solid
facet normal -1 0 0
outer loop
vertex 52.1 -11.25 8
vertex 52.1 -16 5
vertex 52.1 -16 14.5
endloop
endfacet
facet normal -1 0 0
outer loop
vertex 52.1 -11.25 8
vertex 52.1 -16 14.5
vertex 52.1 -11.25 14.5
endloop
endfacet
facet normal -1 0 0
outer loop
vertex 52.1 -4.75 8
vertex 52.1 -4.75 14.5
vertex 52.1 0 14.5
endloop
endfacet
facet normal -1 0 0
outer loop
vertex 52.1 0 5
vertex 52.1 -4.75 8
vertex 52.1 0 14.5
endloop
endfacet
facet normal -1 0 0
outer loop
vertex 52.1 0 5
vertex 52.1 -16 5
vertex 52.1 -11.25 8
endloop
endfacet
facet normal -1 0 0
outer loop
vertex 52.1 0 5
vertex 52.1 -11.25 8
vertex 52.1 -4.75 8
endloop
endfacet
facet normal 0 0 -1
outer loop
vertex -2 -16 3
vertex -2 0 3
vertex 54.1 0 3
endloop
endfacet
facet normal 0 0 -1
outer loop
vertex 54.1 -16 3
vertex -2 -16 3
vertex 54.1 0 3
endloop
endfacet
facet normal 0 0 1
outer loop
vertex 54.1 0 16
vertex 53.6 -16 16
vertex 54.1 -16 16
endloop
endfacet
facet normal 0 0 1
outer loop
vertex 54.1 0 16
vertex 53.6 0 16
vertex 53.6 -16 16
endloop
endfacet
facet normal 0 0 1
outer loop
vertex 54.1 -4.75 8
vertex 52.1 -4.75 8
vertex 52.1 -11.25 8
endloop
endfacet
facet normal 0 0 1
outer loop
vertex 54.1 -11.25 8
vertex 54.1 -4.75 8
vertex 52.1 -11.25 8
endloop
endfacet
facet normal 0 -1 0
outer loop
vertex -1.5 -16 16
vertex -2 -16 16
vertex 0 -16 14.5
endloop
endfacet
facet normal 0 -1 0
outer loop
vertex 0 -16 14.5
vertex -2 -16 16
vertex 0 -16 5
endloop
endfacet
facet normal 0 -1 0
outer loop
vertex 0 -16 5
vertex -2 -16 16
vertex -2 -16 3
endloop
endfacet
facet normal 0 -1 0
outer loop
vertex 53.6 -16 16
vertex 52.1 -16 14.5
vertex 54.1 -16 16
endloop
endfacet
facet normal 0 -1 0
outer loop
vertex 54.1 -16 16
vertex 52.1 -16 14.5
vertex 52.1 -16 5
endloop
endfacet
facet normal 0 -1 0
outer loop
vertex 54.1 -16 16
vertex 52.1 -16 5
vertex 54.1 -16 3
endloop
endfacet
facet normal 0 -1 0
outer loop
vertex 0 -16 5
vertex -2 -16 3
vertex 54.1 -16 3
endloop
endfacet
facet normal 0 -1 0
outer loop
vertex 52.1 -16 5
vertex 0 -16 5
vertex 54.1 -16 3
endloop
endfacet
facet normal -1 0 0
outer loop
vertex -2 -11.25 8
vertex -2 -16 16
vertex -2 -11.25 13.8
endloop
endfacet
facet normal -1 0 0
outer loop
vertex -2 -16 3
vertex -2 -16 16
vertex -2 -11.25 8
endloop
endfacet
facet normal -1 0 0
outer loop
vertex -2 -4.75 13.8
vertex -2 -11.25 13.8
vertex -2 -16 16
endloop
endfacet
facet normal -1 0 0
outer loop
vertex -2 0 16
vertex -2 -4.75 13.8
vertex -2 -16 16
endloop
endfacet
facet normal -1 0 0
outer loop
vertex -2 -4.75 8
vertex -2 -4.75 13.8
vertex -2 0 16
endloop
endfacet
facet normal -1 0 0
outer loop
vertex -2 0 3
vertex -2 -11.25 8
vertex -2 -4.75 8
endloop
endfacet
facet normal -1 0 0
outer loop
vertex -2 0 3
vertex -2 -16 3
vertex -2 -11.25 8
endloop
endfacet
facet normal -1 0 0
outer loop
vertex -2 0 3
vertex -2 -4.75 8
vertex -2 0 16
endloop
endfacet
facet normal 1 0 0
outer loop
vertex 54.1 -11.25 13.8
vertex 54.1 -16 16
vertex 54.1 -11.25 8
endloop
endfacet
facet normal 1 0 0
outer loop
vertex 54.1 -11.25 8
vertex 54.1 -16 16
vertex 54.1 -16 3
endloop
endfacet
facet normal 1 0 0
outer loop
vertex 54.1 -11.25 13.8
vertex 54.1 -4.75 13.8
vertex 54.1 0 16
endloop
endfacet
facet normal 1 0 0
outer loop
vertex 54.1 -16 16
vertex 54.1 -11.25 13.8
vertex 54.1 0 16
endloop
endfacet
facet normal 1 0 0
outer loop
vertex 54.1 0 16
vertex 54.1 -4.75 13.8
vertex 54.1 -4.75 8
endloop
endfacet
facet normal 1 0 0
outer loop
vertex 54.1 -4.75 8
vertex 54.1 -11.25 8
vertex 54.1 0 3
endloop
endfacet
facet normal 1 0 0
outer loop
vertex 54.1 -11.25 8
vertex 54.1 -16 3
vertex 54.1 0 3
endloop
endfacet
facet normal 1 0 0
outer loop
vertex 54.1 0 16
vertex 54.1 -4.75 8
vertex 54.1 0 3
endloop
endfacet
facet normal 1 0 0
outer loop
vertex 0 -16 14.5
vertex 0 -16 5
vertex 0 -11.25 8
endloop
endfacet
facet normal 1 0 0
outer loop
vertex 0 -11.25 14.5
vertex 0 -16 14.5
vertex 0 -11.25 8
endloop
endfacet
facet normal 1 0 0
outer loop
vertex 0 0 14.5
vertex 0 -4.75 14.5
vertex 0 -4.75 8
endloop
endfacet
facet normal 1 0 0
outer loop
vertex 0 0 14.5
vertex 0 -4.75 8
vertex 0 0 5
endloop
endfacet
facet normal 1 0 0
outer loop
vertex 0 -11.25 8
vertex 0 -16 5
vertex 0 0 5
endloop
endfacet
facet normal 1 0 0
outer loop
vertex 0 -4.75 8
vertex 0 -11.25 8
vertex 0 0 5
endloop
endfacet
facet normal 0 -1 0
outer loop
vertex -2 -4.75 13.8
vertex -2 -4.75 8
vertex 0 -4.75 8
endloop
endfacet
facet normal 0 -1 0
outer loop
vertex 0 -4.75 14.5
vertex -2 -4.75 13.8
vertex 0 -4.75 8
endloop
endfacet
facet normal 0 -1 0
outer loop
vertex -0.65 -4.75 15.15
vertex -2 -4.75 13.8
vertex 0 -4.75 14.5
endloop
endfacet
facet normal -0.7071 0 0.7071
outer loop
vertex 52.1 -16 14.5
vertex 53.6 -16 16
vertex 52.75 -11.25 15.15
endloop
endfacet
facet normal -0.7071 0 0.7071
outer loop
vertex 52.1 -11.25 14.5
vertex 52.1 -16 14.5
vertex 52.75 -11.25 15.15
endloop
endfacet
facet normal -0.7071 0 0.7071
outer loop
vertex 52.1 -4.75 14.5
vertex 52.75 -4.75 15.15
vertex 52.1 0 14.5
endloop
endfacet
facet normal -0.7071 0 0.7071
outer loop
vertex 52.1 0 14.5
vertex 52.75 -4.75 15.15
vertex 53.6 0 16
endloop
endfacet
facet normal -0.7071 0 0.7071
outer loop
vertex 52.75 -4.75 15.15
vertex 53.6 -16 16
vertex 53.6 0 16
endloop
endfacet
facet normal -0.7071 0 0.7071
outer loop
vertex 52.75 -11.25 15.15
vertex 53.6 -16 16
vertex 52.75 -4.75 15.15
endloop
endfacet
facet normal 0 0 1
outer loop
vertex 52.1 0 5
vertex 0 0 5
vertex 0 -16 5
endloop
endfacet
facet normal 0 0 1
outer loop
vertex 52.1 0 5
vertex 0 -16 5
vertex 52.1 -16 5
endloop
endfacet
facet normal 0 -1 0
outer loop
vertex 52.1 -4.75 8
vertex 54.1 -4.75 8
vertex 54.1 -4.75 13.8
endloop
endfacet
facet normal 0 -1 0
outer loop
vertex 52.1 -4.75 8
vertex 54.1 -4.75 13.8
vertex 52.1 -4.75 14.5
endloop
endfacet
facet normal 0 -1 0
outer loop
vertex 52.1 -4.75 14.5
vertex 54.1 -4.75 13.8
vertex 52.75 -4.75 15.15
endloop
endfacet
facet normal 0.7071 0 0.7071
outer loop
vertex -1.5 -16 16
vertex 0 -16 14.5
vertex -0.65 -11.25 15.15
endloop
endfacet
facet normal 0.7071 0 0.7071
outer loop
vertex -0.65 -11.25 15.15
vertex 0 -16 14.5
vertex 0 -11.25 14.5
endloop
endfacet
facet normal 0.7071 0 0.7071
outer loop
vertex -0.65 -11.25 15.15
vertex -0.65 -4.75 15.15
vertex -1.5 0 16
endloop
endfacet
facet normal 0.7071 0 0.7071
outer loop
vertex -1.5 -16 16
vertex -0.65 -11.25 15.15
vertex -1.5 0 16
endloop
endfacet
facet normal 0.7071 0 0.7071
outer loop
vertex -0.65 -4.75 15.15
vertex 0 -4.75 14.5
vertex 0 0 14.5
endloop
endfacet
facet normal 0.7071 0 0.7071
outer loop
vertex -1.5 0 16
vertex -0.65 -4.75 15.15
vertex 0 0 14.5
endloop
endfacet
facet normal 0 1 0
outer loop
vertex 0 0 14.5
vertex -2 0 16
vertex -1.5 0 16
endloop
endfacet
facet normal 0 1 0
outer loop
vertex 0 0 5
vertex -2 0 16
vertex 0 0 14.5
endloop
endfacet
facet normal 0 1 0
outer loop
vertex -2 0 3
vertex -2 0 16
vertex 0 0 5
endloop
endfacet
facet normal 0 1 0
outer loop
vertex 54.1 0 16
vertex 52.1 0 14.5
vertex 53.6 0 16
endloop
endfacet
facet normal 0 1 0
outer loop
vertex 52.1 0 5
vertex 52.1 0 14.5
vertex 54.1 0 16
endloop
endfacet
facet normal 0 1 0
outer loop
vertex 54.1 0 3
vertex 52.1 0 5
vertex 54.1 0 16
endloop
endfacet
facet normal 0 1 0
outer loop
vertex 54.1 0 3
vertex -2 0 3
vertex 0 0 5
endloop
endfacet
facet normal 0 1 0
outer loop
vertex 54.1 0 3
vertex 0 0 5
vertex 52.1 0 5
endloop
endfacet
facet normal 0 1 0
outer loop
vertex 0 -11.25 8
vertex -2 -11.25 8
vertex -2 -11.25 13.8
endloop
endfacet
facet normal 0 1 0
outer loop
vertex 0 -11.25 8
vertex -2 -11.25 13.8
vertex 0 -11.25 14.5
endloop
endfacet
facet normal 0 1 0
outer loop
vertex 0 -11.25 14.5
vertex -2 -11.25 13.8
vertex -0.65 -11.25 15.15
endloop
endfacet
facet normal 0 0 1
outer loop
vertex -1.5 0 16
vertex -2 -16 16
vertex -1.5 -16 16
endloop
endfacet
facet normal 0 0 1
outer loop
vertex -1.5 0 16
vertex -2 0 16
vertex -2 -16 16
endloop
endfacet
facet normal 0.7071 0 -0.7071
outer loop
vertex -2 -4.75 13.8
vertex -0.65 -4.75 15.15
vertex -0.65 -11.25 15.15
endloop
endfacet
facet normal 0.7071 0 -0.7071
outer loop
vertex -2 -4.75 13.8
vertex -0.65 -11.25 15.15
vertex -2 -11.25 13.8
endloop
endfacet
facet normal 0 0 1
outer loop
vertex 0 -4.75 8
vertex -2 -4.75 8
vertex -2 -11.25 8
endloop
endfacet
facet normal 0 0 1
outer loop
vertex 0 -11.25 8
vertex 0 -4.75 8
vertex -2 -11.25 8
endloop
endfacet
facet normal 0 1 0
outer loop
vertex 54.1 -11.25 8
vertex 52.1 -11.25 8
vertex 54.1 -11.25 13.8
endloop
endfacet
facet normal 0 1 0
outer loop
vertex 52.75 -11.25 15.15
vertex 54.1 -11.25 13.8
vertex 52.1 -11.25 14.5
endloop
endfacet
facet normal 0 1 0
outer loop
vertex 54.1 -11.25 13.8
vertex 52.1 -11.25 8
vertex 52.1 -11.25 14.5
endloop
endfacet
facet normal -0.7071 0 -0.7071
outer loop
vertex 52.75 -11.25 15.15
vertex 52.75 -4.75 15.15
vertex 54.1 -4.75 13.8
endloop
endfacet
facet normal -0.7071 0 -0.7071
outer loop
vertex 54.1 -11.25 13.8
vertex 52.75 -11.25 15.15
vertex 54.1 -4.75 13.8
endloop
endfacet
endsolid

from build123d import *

# Parameters (mm, degrees)
F0_W        = 52.1
F0_H        = 16
F1_DEPTH    = 5
F2_W        = 2
F2_H        = 16
F3_DEPTH    = 16
F4_W        = 6.5
F4_H        = 5.3
F5_DEPTH    = 195
F6_SIZE     = 1.5
F7_T1_DEPTH = 6.5
F8_DEPTH    = 3


# Not quite as in the source:
# - a fillet or chamfer that OpenCascade refuses, or shapes differently, is made with other operations: its cross-section is extruded or revolved along the edge and cut away or added


with BuildPart() as f1:
    # F0 (on Top) → F1 (new body)
    with BuildSketch(Plane.XY):
        with Locations((26.05, -8)):
            Rectangle(F0_W, F0_H)
    extrude(amount=F1_DEPTH)

    # F2 (on Top) → F3 (join)
    with BuildSketch(Plane.XY):
        with Locations((-1, -8)):
            Rectangle(F2_W, F2_H)
        with Locations((53.1, -8)):
            Rectangle(F2_W, F2_H)
    extrude(amount=F3_DEPTH)

    # F4 (on face) → F5 (cut, symmetric)
    with BuildSketch(Plane(origin=(52.1, 0, 0), x_dir=(0, -1, 0), z_dir=(-1, 0, 0))):
        with Locations((8, 10.65)):
            Rectangle(F4_W, F4_H)
    extrude(amount=F5_DEPTH, both=True, mode=Mode.SUBTRACT)

    # F6
    f6_edges = [f1.edges().sort_by_distance(p)[0] for p in [
        (52.1, -8, 16),
        (0, -8, 16),
    ]]
    chamfer(f6_edges, length=F6_SIZE)

    # F7: chamfer of 2.5 on 2 edges, made by hand

    # F7_s2 → F7_t1 (cut)
    with BuildSketch(Plane.XZ.offset(4.75)):
        Polygon((52.1, 15.8), (54.6, 13.3), (52.1, 13.3), align=None)
        Polygon((0, 15.8), (-2.5, 13.3), (0, 13.3), align=None)
    extrude(amount=F7_T1_DEPTH, mode=Mode.SUBTRACT)

    # F8 (cut): a face of the model
    f8_faces = [f1.faces().sort_by_distance(p)[0] for p in [
        (26.05, -8, 0),
    ]]
    extrude(f8_faces, amount=-F8_DEPTH, mode=Mode.SUBTRACT)


solid = f1.part
